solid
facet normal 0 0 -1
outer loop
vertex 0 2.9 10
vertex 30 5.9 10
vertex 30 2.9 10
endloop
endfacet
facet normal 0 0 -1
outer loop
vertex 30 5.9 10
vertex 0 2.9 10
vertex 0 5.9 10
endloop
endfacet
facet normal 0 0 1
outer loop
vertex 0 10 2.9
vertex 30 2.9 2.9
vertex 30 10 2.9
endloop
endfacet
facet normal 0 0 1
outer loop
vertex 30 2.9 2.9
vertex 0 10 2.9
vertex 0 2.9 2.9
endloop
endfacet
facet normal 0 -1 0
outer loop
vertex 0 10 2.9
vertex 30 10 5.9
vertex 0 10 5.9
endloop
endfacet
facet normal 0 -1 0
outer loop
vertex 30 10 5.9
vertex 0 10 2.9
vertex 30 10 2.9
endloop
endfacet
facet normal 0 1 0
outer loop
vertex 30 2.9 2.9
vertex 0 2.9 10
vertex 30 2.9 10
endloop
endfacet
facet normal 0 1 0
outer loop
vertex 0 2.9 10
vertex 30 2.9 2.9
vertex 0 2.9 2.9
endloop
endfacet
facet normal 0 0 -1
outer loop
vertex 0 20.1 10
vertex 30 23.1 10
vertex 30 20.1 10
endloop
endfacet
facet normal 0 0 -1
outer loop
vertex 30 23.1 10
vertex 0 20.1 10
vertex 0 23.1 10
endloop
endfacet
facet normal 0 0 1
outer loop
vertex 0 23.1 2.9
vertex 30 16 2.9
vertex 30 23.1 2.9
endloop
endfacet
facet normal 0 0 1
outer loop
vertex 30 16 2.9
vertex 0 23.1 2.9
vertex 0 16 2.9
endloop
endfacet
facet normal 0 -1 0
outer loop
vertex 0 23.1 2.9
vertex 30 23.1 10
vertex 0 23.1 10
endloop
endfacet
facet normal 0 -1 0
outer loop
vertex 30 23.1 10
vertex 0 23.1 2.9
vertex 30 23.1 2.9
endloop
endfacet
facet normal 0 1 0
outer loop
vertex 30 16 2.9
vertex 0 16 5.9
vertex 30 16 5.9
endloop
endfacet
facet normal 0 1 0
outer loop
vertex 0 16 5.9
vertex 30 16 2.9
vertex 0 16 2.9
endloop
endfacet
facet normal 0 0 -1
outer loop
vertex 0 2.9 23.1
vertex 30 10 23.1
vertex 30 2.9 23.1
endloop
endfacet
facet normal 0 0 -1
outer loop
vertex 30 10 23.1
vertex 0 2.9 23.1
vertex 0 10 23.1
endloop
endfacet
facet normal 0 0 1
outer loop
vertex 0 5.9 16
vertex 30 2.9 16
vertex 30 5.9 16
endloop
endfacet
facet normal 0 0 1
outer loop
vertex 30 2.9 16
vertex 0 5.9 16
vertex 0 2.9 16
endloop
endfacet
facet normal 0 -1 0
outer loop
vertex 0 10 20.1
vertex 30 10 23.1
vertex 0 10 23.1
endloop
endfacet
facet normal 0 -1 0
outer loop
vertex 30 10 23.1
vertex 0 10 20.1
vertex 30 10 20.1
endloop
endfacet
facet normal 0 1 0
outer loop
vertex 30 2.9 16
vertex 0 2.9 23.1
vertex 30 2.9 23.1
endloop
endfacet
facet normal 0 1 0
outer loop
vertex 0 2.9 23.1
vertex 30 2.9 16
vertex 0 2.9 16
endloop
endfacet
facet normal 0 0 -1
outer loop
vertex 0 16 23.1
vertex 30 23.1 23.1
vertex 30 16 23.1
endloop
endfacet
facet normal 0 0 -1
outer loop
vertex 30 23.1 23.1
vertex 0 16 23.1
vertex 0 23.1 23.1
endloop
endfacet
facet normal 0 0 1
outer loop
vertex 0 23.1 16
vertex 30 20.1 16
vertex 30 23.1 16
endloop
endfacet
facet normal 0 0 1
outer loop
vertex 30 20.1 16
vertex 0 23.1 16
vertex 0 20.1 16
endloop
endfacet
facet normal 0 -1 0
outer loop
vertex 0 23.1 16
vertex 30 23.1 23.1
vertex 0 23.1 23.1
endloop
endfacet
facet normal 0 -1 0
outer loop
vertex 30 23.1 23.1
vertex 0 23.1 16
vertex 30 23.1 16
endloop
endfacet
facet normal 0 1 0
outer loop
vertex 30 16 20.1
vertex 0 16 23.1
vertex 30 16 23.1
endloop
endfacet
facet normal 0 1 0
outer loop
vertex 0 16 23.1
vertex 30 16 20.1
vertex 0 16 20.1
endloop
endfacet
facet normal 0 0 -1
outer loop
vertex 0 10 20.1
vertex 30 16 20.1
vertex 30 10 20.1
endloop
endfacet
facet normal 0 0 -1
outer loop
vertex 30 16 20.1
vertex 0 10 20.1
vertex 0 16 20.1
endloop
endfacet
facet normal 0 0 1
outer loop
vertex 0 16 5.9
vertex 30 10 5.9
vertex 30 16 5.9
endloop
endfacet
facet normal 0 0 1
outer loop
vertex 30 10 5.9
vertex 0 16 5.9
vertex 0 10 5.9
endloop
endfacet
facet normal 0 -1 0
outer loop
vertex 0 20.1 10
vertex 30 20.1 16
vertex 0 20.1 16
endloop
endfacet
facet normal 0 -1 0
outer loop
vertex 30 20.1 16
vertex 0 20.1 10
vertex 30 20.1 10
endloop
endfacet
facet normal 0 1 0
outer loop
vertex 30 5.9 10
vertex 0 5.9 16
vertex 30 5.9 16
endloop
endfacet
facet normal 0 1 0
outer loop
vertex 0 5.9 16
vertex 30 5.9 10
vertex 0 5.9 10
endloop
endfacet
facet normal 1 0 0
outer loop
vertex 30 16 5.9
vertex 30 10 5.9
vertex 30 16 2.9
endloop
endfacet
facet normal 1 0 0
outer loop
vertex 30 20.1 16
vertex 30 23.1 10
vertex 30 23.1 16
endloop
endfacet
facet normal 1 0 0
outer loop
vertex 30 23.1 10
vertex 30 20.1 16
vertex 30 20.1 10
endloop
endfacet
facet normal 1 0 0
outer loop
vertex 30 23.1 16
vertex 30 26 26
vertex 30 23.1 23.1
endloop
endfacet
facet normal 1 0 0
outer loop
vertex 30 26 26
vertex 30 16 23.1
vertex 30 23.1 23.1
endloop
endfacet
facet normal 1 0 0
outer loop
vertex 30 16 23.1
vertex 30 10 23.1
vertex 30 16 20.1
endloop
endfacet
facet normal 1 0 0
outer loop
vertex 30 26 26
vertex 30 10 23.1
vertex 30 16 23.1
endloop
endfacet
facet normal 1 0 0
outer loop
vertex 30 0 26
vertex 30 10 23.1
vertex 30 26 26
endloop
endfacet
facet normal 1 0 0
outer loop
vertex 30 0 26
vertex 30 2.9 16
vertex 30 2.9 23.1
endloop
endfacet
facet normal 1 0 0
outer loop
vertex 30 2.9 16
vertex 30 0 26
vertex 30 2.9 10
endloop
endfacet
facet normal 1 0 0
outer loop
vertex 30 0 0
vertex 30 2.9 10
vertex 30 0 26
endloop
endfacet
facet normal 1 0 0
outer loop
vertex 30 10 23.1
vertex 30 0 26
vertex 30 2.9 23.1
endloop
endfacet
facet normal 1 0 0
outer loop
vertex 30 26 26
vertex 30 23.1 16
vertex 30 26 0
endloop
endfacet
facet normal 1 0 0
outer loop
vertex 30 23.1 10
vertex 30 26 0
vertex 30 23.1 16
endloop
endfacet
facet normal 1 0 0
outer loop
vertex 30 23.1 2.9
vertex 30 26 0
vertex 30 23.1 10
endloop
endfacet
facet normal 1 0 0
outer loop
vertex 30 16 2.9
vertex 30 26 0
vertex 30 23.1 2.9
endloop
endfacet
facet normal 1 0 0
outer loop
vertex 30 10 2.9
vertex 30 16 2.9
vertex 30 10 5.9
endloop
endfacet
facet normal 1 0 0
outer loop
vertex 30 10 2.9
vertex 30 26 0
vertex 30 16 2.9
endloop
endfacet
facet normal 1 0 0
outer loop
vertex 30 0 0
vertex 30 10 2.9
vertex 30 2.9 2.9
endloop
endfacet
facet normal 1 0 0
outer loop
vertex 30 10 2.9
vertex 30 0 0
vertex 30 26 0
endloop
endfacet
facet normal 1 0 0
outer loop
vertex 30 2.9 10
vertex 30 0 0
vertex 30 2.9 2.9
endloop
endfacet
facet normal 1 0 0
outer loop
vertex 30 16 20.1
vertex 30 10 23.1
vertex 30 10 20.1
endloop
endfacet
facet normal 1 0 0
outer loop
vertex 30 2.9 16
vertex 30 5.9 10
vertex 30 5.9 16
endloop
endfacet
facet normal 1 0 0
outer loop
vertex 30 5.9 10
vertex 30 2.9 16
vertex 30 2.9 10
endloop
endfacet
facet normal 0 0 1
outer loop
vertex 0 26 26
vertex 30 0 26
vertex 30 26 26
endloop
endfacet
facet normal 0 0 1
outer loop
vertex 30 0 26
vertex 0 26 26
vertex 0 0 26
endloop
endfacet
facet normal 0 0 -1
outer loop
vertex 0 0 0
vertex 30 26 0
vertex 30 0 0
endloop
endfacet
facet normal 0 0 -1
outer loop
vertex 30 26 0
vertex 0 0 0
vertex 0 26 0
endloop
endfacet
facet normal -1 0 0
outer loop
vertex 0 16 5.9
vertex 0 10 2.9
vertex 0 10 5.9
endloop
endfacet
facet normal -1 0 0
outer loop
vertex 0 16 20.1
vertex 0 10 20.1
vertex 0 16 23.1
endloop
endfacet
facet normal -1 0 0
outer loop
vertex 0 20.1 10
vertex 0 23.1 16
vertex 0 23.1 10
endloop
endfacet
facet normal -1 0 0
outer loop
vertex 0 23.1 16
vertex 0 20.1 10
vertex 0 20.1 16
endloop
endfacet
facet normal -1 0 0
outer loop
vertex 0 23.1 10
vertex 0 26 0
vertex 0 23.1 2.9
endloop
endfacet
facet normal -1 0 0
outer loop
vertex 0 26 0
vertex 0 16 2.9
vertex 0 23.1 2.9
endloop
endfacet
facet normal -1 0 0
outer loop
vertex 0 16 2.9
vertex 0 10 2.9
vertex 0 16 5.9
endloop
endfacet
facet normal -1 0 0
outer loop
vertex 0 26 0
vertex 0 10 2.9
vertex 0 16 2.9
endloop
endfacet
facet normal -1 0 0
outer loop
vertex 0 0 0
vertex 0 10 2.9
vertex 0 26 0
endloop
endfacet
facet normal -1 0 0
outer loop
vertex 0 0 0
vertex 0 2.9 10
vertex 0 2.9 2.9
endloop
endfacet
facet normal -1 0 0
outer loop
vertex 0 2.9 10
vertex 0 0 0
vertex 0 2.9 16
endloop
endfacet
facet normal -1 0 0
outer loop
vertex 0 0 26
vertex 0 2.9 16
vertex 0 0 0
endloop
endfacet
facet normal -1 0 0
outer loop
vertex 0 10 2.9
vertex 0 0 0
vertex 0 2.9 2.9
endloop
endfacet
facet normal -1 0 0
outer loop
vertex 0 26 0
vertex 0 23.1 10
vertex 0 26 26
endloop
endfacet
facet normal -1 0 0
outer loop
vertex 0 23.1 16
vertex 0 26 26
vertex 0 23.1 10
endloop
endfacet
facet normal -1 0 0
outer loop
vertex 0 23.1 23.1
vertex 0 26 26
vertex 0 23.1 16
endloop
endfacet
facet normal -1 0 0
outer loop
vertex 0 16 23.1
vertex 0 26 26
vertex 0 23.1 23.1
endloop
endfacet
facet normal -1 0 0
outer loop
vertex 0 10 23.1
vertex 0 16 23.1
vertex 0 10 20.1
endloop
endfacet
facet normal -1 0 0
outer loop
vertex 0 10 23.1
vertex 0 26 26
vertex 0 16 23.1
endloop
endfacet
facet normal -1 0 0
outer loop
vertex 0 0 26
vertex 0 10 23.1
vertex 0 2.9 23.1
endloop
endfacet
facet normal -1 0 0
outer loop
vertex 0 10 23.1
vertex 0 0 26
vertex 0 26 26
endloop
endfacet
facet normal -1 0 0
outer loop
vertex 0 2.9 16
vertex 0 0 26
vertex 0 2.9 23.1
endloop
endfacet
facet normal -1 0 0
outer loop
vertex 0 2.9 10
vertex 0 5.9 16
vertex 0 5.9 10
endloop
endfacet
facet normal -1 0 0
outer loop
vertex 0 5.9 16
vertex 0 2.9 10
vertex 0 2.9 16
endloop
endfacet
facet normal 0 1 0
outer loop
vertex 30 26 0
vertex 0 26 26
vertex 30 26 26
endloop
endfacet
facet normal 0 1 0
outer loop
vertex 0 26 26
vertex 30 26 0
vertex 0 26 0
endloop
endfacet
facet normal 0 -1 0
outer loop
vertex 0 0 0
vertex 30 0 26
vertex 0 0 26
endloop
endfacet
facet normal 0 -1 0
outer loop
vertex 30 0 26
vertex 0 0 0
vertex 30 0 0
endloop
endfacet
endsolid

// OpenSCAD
/* [Tips] */
// Length of the tips
tipsL = 30.0;  // [1,2,3,4,5,6,7,8,9,30]
// Width of the tips
tipsW = 26.0;

/* [Profiles] */
// Width of the profiles
profilesW = 20.2;

/* [Blocs] */
// Length of the blocs
blocsL = 6;
// Width of the blocs
blocsW = 3;

/* [Hidden] */

// to avoid "z fighting" where surfaces line up exactly, add a bit of fudge
fudge = 0.1;

module void_profile(
    length,         // Length of the profile
    width = 20,     // Width of the profile
    blocL = 6,      // Lenght of the bloc
    blocW = 3,      // Width of the bloc
    fudge = 0.1)    // 
{
    step = (width - blocL)/2;
    
    // Bottom-left hole
    translate([-fudge,0,0])             
    cube([length+2*fudge,step,step]);

    // Bottom-rigth hole
    translate([-fudge,step+blocL,0])    
    cube([length+2*fudge,step,step]);

    // Top-left hole
    translate([-fudge,0,step+blocL])
    cube([length+2*fudge,step,step]);

    // Top-rigth hole
    translate([-fudge,step+blocL,step+blocL])
    cube([length+2*fudge,step,step]);

    // Middle hole
    translate([-fudge,blocW,blocW])
    cube([length+2*fudge,width-2*blocW,width-2*blocW]);
}

module tip_profile(
    tipL,           // Length of the tip
    tipW,           // Width of the tip
    profileW,       // Width of the profile
    blocL,          // Length of the bloc
    blocW,          // Width of the bloc
    fudge=0.1)        // 
{
    difference()
    {
        // The tip
        color("blue")
        cube([tipL, tipW, tipW]);
        
        color("red")
        translate([0, (tipW-profileW)/2, (tipW-profileW)/2])
        void_profile(tipL+fudge, profileW, blocL, blocW, fudge);
    }
}

union()
{
    //color("green")
    //cube(tipsW);

    //translate([tipsW, 0, 0])
    tip_profile(tipsL, tipsW, profilesW, blocsL, blocsW, fudge);
}
